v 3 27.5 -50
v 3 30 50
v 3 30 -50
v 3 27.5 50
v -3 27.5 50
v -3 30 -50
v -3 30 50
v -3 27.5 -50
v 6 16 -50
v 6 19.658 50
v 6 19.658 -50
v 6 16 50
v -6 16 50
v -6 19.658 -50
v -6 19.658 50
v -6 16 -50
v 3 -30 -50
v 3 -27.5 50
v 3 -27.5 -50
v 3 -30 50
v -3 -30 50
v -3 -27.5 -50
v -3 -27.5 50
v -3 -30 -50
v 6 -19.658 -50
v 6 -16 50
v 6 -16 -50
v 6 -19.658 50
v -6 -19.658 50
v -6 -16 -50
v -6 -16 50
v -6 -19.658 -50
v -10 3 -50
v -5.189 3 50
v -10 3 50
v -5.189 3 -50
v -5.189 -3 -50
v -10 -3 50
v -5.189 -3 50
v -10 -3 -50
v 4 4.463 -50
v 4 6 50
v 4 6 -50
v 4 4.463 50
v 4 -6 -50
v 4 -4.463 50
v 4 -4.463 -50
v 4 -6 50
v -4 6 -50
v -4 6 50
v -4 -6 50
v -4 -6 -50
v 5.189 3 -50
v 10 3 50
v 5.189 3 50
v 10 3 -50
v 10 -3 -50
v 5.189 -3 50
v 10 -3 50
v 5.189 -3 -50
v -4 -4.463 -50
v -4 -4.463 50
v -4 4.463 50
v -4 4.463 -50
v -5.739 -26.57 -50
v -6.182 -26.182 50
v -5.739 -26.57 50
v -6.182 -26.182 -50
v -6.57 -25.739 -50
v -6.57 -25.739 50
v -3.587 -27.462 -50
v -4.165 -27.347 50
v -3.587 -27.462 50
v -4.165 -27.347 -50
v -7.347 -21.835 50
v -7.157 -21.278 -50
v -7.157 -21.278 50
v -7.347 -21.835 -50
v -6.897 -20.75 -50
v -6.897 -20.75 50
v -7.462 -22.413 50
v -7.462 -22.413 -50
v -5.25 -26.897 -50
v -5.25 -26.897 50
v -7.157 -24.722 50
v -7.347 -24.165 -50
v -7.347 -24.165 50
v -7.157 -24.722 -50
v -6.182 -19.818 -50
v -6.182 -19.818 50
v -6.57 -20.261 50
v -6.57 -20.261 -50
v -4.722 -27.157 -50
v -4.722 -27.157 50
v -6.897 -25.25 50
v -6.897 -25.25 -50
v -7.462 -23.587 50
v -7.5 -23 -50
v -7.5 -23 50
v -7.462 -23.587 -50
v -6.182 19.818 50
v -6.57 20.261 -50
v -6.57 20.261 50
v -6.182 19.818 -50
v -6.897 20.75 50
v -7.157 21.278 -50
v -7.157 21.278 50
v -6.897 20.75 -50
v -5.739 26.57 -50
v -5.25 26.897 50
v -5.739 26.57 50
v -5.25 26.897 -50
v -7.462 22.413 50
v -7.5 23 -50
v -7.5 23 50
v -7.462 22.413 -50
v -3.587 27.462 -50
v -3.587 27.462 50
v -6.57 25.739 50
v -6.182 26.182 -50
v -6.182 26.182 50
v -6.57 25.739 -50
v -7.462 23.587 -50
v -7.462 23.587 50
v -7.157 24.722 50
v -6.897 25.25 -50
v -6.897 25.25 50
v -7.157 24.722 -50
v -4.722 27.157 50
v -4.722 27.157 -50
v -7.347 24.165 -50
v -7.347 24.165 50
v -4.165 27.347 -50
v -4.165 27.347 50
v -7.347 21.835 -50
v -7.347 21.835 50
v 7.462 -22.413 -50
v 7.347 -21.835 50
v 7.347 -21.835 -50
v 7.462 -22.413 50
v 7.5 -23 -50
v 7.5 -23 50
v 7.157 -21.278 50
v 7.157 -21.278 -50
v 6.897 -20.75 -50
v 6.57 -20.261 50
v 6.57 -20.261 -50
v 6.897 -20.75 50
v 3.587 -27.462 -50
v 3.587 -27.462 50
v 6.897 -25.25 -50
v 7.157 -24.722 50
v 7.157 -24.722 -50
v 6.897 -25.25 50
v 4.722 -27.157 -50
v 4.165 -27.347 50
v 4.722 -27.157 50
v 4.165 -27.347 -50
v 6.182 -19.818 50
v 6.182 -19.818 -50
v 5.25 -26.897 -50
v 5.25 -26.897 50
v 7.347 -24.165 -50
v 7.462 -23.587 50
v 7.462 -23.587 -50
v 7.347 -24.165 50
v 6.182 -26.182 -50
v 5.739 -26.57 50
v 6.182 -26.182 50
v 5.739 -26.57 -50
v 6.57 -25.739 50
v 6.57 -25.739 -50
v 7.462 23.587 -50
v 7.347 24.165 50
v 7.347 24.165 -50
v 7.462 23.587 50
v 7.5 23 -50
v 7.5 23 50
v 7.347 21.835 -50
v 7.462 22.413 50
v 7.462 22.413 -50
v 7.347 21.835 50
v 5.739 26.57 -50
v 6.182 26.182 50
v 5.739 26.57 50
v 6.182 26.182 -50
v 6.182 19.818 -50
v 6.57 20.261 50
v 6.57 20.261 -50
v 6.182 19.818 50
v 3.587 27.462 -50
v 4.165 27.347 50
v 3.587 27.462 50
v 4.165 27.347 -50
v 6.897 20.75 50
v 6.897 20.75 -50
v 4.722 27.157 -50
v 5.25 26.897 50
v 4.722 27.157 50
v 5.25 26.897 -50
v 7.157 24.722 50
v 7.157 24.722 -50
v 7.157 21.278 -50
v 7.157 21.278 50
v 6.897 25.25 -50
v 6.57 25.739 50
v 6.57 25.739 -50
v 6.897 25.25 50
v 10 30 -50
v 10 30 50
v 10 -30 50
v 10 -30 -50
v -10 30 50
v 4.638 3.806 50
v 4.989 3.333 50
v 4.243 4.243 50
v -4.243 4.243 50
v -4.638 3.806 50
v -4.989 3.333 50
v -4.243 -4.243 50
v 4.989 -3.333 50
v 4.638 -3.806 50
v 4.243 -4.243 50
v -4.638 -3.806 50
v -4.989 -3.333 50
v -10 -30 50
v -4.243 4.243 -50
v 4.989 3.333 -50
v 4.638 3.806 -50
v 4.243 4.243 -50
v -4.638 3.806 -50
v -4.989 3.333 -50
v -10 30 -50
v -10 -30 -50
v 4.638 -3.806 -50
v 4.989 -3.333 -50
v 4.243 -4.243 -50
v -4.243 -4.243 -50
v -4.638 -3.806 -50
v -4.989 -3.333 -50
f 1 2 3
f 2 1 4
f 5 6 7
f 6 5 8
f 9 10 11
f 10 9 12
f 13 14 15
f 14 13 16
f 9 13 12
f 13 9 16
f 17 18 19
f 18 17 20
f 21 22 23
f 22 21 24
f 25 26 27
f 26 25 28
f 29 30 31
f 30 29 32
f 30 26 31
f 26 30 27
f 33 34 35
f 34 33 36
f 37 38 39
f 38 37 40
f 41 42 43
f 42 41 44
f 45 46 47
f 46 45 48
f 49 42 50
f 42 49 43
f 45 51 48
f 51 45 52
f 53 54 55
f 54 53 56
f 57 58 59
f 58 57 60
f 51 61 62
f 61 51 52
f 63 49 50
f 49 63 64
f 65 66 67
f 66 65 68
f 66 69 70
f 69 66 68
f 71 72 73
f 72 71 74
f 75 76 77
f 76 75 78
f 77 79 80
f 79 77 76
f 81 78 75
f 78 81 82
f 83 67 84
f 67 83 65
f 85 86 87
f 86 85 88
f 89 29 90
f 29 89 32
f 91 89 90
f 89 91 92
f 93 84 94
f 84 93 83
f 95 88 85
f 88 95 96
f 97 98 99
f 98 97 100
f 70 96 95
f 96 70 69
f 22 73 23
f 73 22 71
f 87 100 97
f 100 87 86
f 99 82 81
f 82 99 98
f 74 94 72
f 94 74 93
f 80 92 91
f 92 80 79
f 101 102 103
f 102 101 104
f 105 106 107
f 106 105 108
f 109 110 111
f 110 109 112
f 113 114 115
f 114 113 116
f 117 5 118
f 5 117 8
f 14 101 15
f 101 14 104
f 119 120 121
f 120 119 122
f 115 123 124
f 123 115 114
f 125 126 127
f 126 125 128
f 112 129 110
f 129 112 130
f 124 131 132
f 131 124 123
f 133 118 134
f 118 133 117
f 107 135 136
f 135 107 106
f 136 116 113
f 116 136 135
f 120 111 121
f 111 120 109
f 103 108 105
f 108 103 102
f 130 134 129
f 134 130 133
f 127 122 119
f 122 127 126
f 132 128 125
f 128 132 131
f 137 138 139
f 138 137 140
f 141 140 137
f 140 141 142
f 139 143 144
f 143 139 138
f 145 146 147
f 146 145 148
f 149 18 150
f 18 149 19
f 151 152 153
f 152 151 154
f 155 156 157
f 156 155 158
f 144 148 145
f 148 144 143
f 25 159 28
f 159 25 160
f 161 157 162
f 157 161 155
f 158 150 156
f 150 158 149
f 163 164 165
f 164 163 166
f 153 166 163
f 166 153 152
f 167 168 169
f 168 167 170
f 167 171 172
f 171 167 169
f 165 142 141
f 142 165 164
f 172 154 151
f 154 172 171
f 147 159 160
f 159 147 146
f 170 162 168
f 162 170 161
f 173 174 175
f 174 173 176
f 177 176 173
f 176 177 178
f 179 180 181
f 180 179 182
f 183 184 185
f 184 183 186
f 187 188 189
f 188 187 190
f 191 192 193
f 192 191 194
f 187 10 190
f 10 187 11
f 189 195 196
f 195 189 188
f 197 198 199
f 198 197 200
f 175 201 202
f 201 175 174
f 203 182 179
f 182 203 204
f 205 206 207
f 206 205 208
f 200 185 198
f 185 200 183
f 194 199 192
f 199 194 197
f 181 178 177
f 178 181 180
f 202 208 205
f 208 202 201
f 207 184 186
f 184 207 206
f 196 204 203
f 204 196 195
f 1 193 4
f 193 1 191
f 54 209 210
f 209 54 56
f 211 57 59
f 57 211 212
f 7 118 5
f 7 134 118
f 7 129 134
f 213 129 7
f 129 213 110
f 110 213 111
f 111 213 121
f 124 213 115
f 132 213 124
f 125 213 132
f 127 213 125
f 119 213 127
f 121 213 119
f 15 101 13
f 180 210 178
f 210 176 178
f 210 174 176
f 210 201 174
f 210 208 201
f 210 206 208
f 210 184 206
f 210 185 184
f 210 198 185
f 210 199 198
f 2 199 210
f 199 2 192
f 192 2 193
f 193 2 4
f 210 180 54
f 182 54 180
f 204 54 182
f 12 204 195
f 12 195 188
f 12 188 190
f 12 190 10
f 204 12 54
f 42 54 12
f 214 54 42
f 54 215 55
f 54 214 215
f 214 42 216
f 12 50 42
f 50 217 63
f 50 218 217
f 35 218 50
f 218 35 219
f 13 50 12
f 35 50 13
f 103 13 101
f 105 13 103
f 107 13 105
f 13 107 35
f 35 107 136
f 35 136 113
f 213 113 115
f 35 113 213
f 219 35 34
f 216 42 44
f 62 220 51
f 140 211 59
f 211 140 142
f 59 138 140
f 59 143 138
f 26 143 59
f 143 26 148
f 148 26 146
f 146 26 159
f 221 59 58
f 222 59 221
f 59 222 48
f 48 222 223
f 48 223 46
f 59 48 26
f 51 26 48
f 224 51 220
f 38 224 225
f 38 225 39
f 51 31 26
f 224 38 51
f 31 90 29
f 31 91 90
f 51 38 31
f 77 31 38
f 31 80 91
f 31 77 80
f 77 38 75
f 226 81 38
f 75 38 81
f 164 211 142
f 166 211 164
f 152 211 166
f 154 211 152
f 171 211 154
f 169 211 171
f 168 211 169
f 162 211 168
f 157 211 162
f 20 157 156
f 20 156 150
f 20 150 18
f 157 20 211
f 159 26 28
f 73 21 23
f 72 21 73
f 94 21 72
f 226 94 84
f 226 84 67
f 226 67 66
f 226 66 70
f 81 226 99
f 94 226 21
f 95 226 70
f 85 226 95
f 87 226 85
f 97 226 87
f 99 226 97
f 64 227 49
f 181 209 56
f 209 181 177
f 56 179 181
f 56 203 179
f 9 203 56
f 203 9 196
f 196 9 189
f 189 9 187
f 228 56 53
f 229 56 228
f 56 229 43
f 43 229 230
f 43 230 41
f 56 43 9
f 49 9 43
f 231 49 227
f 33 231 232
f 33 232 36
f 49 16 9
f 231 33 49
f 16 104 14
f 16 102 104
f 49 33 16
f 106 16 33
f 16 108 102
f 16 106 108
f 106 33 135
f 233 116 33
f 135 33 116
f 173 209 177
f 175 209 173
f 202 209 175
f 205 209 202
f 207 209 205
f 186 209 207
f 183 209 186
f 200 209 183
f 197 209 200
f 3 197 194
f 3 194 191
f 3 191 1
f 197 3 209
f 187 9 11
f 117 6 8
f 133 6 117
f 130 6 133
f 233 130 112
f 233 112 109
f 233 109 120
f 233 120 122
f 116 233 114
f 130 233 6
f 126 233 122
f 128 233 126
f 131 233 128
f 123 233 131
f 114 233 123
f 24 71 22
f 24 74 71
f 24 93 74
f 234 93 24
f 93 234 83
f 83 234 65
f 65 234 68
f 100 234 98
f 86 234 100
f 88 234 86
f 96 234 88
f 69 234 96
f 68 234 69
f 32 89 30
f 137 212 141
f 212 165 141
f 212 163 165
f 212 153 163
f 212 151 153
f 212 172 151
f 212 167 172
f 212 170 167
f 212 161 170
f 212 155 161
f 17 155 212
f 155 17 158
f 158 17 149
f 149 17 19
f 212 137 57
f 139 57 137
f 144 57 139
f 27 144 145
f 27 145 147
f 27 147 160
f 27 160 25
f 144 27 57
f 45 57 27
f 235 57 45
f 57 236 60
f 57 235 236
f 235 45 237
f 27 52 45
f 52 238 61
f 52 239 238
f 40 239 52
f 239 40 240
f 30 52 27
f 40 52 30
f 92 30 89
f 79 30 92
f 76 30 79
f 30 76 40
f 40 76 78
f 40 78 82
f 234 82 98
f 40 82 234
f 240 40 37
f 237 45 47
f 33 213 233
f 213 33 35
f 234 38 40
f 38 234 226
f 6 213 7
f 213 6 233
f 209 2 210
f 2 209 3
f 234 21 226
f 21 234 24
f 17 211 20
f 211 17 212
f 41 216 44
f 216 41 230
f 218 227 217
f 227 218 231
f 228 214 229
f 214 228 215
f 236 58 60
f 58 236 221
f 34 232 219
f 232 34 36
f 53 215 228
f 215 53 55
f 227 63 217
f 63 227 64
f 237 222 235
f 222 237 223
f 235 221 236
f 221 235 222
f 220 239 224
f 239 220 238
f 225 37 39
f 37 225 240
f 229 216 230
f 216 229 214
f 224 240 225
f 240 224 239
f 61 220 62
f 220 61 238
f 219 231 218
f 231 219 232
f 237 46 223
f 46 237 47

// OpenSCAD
// 20x60 aluminium extrusion profile, 100mm long (simplified, correct 20:60 cross-section)

// Parameters
profile_W = 20;   // X (mm)
profile_H = 60;   // Y (mm)
length_L  = 100;  // Z (mm)

// Small overlap to avoid coplanar artifacts
eps = 0.02;

// Profile detail parameters (simplified but proportionally plausible)
wall_t      = 2.0;   // outer wall thickness
slot_open   = 6.0;   // T-slot mouth opening at surface
slot_depth  = 6.0;   // depth from surface to inner cavity
slot_cavity = 12.0;  // inner cavity width behind the mouth
core_r      = 6.0;   // central bore radius

function clamp(v, lo, hi) = v < lo ? lo : (v > hi ? hi : v);

// Clamp slot sizes to fit each face independently (20mm faces vs 60mm faces)
slot_open_W   = clamp(slot_open, 2, profile_W - 2*wall_t - 1);
slot_open_H   = clamp(slot_open, 2, profile_H - 2*wall_t - 1);

slot_depth_W  = clamp(slot_depth, 2, profile_W/2 - wall_t - 1);
slot_depth_H  = clamp(slot_depth, 2, profile_H/2 - wall_t - 1);

slot_cavity_W = clamp(slot_cavity, slot_open_W + 2, profile_W - 2*wall_t - 2);
slot_cavity_H = clamp(slot_cavity, slot_open_H + 2, profile_H - 2*wall_t - 2);

module tslot_on_face(face="top", L=length_L) {
    // Cuts a simplified T-slot on one face of the 20x60 rectangle.
    // All translate() values are derived from profile dimensions.
    if (face == "top") {
        // Opens to +Y face (width along X)
        translate([0, profile_H/2 - slot_depth_H/2 + eps, 0])
            cube([slot_open_H, slot_depth_H + 2*eps, L + 2*eps], center=true);

        translate([0, profile_H/2 - slot_depth_H - wall_t - slot_depth_H/2 + eps, 0])
            cube([slot_cavity_H, slot_depth_H + 2*eps, L + 2*eps], center=true);
    } else if (face == "bottom") {
        // Opens to -Y face
        translate([0, -profile_H/2 + slot_depth_H/2 - eps, 0])
            cube([slot_open_H, slot_depth_H + 2*eps, L + 2*eps], center=true);

        translate([0, -profile_H/2 + slot_depth_H + wall_t + slot_depth_H/2 - eps, 0])
            cube([slot_cavity_H, slot_depth_H + 2*eps, L + 2*eps], center=true);
    } else if (face == "right") {
        // Opens to +X face (width along Y)
        translate([profile_W/2 - slot_depth_W/2 + eps, 0, 0])
            cube([slot_depth_W + 2*eps, slot_open_W, L + 2*eps], center=true);

        translate([profile_W/2 - slot_depth_W - wall_t - slot_depth_W/2 + eps, 0, 0])
            cube([slot_depth_W + 2*eps, slot_cavity_W, L + 2*eps], center=true);
    } else if (face == "left") {
        // Opens to -X face
        translate([-profile_W/2 + slot_depth_W/2 - eps, 0, 0])
            cube([slot_depth_W + 2*eps, slot_open_W, L + 2*eps], center=true);

        translate([-profile_W/2 + slot_depth_W + wall_t + slot_depth_W/2 - eps, 0, 0])
            cube([slot_depth_W + 2*eps, slot_cavity_W, L + 2*eps], center=true);
    }
}

module extrusion_20x60(L=length_L) {
    color("Silver")
    difference() {
        // Outer body: correct 20 x 60 cross-section, length L
        cube([profile_W, profile_H, L], center=true);

        // Central bore (through)
        cylinder(r=core_r, h=L + 2*eps, center=true, $fn=64);

        // Four T-slots: one on each face (top/bottom use 60mm face, left/right use 20mm face)
        tslot_on_face("top",    L);
        tslot_on_face("bottom", L);
        tslot_on_face("left",   L);
        tslot_on_face("right",  L);

        // Corner relief pockets (kept inside walls; derived from dimensions)
        pocket_r = 4.5;
        pocket_x = profile_W/2 - wall_t - pocket_r - 0.5;
        pocket_y = profile_H/2 - wall_t - pocket_r - 0.5;

        for (sx = [-1, 1], sy = [-1, 1]) {
            translate([sx*pocket_x, sy*pocket_y, 0])
                cylinder(r=pocket_r, h=L + 2*eps, center=true, $fn=48);
        }
    }
}

// Render
extrusion_20x60(length_L);
